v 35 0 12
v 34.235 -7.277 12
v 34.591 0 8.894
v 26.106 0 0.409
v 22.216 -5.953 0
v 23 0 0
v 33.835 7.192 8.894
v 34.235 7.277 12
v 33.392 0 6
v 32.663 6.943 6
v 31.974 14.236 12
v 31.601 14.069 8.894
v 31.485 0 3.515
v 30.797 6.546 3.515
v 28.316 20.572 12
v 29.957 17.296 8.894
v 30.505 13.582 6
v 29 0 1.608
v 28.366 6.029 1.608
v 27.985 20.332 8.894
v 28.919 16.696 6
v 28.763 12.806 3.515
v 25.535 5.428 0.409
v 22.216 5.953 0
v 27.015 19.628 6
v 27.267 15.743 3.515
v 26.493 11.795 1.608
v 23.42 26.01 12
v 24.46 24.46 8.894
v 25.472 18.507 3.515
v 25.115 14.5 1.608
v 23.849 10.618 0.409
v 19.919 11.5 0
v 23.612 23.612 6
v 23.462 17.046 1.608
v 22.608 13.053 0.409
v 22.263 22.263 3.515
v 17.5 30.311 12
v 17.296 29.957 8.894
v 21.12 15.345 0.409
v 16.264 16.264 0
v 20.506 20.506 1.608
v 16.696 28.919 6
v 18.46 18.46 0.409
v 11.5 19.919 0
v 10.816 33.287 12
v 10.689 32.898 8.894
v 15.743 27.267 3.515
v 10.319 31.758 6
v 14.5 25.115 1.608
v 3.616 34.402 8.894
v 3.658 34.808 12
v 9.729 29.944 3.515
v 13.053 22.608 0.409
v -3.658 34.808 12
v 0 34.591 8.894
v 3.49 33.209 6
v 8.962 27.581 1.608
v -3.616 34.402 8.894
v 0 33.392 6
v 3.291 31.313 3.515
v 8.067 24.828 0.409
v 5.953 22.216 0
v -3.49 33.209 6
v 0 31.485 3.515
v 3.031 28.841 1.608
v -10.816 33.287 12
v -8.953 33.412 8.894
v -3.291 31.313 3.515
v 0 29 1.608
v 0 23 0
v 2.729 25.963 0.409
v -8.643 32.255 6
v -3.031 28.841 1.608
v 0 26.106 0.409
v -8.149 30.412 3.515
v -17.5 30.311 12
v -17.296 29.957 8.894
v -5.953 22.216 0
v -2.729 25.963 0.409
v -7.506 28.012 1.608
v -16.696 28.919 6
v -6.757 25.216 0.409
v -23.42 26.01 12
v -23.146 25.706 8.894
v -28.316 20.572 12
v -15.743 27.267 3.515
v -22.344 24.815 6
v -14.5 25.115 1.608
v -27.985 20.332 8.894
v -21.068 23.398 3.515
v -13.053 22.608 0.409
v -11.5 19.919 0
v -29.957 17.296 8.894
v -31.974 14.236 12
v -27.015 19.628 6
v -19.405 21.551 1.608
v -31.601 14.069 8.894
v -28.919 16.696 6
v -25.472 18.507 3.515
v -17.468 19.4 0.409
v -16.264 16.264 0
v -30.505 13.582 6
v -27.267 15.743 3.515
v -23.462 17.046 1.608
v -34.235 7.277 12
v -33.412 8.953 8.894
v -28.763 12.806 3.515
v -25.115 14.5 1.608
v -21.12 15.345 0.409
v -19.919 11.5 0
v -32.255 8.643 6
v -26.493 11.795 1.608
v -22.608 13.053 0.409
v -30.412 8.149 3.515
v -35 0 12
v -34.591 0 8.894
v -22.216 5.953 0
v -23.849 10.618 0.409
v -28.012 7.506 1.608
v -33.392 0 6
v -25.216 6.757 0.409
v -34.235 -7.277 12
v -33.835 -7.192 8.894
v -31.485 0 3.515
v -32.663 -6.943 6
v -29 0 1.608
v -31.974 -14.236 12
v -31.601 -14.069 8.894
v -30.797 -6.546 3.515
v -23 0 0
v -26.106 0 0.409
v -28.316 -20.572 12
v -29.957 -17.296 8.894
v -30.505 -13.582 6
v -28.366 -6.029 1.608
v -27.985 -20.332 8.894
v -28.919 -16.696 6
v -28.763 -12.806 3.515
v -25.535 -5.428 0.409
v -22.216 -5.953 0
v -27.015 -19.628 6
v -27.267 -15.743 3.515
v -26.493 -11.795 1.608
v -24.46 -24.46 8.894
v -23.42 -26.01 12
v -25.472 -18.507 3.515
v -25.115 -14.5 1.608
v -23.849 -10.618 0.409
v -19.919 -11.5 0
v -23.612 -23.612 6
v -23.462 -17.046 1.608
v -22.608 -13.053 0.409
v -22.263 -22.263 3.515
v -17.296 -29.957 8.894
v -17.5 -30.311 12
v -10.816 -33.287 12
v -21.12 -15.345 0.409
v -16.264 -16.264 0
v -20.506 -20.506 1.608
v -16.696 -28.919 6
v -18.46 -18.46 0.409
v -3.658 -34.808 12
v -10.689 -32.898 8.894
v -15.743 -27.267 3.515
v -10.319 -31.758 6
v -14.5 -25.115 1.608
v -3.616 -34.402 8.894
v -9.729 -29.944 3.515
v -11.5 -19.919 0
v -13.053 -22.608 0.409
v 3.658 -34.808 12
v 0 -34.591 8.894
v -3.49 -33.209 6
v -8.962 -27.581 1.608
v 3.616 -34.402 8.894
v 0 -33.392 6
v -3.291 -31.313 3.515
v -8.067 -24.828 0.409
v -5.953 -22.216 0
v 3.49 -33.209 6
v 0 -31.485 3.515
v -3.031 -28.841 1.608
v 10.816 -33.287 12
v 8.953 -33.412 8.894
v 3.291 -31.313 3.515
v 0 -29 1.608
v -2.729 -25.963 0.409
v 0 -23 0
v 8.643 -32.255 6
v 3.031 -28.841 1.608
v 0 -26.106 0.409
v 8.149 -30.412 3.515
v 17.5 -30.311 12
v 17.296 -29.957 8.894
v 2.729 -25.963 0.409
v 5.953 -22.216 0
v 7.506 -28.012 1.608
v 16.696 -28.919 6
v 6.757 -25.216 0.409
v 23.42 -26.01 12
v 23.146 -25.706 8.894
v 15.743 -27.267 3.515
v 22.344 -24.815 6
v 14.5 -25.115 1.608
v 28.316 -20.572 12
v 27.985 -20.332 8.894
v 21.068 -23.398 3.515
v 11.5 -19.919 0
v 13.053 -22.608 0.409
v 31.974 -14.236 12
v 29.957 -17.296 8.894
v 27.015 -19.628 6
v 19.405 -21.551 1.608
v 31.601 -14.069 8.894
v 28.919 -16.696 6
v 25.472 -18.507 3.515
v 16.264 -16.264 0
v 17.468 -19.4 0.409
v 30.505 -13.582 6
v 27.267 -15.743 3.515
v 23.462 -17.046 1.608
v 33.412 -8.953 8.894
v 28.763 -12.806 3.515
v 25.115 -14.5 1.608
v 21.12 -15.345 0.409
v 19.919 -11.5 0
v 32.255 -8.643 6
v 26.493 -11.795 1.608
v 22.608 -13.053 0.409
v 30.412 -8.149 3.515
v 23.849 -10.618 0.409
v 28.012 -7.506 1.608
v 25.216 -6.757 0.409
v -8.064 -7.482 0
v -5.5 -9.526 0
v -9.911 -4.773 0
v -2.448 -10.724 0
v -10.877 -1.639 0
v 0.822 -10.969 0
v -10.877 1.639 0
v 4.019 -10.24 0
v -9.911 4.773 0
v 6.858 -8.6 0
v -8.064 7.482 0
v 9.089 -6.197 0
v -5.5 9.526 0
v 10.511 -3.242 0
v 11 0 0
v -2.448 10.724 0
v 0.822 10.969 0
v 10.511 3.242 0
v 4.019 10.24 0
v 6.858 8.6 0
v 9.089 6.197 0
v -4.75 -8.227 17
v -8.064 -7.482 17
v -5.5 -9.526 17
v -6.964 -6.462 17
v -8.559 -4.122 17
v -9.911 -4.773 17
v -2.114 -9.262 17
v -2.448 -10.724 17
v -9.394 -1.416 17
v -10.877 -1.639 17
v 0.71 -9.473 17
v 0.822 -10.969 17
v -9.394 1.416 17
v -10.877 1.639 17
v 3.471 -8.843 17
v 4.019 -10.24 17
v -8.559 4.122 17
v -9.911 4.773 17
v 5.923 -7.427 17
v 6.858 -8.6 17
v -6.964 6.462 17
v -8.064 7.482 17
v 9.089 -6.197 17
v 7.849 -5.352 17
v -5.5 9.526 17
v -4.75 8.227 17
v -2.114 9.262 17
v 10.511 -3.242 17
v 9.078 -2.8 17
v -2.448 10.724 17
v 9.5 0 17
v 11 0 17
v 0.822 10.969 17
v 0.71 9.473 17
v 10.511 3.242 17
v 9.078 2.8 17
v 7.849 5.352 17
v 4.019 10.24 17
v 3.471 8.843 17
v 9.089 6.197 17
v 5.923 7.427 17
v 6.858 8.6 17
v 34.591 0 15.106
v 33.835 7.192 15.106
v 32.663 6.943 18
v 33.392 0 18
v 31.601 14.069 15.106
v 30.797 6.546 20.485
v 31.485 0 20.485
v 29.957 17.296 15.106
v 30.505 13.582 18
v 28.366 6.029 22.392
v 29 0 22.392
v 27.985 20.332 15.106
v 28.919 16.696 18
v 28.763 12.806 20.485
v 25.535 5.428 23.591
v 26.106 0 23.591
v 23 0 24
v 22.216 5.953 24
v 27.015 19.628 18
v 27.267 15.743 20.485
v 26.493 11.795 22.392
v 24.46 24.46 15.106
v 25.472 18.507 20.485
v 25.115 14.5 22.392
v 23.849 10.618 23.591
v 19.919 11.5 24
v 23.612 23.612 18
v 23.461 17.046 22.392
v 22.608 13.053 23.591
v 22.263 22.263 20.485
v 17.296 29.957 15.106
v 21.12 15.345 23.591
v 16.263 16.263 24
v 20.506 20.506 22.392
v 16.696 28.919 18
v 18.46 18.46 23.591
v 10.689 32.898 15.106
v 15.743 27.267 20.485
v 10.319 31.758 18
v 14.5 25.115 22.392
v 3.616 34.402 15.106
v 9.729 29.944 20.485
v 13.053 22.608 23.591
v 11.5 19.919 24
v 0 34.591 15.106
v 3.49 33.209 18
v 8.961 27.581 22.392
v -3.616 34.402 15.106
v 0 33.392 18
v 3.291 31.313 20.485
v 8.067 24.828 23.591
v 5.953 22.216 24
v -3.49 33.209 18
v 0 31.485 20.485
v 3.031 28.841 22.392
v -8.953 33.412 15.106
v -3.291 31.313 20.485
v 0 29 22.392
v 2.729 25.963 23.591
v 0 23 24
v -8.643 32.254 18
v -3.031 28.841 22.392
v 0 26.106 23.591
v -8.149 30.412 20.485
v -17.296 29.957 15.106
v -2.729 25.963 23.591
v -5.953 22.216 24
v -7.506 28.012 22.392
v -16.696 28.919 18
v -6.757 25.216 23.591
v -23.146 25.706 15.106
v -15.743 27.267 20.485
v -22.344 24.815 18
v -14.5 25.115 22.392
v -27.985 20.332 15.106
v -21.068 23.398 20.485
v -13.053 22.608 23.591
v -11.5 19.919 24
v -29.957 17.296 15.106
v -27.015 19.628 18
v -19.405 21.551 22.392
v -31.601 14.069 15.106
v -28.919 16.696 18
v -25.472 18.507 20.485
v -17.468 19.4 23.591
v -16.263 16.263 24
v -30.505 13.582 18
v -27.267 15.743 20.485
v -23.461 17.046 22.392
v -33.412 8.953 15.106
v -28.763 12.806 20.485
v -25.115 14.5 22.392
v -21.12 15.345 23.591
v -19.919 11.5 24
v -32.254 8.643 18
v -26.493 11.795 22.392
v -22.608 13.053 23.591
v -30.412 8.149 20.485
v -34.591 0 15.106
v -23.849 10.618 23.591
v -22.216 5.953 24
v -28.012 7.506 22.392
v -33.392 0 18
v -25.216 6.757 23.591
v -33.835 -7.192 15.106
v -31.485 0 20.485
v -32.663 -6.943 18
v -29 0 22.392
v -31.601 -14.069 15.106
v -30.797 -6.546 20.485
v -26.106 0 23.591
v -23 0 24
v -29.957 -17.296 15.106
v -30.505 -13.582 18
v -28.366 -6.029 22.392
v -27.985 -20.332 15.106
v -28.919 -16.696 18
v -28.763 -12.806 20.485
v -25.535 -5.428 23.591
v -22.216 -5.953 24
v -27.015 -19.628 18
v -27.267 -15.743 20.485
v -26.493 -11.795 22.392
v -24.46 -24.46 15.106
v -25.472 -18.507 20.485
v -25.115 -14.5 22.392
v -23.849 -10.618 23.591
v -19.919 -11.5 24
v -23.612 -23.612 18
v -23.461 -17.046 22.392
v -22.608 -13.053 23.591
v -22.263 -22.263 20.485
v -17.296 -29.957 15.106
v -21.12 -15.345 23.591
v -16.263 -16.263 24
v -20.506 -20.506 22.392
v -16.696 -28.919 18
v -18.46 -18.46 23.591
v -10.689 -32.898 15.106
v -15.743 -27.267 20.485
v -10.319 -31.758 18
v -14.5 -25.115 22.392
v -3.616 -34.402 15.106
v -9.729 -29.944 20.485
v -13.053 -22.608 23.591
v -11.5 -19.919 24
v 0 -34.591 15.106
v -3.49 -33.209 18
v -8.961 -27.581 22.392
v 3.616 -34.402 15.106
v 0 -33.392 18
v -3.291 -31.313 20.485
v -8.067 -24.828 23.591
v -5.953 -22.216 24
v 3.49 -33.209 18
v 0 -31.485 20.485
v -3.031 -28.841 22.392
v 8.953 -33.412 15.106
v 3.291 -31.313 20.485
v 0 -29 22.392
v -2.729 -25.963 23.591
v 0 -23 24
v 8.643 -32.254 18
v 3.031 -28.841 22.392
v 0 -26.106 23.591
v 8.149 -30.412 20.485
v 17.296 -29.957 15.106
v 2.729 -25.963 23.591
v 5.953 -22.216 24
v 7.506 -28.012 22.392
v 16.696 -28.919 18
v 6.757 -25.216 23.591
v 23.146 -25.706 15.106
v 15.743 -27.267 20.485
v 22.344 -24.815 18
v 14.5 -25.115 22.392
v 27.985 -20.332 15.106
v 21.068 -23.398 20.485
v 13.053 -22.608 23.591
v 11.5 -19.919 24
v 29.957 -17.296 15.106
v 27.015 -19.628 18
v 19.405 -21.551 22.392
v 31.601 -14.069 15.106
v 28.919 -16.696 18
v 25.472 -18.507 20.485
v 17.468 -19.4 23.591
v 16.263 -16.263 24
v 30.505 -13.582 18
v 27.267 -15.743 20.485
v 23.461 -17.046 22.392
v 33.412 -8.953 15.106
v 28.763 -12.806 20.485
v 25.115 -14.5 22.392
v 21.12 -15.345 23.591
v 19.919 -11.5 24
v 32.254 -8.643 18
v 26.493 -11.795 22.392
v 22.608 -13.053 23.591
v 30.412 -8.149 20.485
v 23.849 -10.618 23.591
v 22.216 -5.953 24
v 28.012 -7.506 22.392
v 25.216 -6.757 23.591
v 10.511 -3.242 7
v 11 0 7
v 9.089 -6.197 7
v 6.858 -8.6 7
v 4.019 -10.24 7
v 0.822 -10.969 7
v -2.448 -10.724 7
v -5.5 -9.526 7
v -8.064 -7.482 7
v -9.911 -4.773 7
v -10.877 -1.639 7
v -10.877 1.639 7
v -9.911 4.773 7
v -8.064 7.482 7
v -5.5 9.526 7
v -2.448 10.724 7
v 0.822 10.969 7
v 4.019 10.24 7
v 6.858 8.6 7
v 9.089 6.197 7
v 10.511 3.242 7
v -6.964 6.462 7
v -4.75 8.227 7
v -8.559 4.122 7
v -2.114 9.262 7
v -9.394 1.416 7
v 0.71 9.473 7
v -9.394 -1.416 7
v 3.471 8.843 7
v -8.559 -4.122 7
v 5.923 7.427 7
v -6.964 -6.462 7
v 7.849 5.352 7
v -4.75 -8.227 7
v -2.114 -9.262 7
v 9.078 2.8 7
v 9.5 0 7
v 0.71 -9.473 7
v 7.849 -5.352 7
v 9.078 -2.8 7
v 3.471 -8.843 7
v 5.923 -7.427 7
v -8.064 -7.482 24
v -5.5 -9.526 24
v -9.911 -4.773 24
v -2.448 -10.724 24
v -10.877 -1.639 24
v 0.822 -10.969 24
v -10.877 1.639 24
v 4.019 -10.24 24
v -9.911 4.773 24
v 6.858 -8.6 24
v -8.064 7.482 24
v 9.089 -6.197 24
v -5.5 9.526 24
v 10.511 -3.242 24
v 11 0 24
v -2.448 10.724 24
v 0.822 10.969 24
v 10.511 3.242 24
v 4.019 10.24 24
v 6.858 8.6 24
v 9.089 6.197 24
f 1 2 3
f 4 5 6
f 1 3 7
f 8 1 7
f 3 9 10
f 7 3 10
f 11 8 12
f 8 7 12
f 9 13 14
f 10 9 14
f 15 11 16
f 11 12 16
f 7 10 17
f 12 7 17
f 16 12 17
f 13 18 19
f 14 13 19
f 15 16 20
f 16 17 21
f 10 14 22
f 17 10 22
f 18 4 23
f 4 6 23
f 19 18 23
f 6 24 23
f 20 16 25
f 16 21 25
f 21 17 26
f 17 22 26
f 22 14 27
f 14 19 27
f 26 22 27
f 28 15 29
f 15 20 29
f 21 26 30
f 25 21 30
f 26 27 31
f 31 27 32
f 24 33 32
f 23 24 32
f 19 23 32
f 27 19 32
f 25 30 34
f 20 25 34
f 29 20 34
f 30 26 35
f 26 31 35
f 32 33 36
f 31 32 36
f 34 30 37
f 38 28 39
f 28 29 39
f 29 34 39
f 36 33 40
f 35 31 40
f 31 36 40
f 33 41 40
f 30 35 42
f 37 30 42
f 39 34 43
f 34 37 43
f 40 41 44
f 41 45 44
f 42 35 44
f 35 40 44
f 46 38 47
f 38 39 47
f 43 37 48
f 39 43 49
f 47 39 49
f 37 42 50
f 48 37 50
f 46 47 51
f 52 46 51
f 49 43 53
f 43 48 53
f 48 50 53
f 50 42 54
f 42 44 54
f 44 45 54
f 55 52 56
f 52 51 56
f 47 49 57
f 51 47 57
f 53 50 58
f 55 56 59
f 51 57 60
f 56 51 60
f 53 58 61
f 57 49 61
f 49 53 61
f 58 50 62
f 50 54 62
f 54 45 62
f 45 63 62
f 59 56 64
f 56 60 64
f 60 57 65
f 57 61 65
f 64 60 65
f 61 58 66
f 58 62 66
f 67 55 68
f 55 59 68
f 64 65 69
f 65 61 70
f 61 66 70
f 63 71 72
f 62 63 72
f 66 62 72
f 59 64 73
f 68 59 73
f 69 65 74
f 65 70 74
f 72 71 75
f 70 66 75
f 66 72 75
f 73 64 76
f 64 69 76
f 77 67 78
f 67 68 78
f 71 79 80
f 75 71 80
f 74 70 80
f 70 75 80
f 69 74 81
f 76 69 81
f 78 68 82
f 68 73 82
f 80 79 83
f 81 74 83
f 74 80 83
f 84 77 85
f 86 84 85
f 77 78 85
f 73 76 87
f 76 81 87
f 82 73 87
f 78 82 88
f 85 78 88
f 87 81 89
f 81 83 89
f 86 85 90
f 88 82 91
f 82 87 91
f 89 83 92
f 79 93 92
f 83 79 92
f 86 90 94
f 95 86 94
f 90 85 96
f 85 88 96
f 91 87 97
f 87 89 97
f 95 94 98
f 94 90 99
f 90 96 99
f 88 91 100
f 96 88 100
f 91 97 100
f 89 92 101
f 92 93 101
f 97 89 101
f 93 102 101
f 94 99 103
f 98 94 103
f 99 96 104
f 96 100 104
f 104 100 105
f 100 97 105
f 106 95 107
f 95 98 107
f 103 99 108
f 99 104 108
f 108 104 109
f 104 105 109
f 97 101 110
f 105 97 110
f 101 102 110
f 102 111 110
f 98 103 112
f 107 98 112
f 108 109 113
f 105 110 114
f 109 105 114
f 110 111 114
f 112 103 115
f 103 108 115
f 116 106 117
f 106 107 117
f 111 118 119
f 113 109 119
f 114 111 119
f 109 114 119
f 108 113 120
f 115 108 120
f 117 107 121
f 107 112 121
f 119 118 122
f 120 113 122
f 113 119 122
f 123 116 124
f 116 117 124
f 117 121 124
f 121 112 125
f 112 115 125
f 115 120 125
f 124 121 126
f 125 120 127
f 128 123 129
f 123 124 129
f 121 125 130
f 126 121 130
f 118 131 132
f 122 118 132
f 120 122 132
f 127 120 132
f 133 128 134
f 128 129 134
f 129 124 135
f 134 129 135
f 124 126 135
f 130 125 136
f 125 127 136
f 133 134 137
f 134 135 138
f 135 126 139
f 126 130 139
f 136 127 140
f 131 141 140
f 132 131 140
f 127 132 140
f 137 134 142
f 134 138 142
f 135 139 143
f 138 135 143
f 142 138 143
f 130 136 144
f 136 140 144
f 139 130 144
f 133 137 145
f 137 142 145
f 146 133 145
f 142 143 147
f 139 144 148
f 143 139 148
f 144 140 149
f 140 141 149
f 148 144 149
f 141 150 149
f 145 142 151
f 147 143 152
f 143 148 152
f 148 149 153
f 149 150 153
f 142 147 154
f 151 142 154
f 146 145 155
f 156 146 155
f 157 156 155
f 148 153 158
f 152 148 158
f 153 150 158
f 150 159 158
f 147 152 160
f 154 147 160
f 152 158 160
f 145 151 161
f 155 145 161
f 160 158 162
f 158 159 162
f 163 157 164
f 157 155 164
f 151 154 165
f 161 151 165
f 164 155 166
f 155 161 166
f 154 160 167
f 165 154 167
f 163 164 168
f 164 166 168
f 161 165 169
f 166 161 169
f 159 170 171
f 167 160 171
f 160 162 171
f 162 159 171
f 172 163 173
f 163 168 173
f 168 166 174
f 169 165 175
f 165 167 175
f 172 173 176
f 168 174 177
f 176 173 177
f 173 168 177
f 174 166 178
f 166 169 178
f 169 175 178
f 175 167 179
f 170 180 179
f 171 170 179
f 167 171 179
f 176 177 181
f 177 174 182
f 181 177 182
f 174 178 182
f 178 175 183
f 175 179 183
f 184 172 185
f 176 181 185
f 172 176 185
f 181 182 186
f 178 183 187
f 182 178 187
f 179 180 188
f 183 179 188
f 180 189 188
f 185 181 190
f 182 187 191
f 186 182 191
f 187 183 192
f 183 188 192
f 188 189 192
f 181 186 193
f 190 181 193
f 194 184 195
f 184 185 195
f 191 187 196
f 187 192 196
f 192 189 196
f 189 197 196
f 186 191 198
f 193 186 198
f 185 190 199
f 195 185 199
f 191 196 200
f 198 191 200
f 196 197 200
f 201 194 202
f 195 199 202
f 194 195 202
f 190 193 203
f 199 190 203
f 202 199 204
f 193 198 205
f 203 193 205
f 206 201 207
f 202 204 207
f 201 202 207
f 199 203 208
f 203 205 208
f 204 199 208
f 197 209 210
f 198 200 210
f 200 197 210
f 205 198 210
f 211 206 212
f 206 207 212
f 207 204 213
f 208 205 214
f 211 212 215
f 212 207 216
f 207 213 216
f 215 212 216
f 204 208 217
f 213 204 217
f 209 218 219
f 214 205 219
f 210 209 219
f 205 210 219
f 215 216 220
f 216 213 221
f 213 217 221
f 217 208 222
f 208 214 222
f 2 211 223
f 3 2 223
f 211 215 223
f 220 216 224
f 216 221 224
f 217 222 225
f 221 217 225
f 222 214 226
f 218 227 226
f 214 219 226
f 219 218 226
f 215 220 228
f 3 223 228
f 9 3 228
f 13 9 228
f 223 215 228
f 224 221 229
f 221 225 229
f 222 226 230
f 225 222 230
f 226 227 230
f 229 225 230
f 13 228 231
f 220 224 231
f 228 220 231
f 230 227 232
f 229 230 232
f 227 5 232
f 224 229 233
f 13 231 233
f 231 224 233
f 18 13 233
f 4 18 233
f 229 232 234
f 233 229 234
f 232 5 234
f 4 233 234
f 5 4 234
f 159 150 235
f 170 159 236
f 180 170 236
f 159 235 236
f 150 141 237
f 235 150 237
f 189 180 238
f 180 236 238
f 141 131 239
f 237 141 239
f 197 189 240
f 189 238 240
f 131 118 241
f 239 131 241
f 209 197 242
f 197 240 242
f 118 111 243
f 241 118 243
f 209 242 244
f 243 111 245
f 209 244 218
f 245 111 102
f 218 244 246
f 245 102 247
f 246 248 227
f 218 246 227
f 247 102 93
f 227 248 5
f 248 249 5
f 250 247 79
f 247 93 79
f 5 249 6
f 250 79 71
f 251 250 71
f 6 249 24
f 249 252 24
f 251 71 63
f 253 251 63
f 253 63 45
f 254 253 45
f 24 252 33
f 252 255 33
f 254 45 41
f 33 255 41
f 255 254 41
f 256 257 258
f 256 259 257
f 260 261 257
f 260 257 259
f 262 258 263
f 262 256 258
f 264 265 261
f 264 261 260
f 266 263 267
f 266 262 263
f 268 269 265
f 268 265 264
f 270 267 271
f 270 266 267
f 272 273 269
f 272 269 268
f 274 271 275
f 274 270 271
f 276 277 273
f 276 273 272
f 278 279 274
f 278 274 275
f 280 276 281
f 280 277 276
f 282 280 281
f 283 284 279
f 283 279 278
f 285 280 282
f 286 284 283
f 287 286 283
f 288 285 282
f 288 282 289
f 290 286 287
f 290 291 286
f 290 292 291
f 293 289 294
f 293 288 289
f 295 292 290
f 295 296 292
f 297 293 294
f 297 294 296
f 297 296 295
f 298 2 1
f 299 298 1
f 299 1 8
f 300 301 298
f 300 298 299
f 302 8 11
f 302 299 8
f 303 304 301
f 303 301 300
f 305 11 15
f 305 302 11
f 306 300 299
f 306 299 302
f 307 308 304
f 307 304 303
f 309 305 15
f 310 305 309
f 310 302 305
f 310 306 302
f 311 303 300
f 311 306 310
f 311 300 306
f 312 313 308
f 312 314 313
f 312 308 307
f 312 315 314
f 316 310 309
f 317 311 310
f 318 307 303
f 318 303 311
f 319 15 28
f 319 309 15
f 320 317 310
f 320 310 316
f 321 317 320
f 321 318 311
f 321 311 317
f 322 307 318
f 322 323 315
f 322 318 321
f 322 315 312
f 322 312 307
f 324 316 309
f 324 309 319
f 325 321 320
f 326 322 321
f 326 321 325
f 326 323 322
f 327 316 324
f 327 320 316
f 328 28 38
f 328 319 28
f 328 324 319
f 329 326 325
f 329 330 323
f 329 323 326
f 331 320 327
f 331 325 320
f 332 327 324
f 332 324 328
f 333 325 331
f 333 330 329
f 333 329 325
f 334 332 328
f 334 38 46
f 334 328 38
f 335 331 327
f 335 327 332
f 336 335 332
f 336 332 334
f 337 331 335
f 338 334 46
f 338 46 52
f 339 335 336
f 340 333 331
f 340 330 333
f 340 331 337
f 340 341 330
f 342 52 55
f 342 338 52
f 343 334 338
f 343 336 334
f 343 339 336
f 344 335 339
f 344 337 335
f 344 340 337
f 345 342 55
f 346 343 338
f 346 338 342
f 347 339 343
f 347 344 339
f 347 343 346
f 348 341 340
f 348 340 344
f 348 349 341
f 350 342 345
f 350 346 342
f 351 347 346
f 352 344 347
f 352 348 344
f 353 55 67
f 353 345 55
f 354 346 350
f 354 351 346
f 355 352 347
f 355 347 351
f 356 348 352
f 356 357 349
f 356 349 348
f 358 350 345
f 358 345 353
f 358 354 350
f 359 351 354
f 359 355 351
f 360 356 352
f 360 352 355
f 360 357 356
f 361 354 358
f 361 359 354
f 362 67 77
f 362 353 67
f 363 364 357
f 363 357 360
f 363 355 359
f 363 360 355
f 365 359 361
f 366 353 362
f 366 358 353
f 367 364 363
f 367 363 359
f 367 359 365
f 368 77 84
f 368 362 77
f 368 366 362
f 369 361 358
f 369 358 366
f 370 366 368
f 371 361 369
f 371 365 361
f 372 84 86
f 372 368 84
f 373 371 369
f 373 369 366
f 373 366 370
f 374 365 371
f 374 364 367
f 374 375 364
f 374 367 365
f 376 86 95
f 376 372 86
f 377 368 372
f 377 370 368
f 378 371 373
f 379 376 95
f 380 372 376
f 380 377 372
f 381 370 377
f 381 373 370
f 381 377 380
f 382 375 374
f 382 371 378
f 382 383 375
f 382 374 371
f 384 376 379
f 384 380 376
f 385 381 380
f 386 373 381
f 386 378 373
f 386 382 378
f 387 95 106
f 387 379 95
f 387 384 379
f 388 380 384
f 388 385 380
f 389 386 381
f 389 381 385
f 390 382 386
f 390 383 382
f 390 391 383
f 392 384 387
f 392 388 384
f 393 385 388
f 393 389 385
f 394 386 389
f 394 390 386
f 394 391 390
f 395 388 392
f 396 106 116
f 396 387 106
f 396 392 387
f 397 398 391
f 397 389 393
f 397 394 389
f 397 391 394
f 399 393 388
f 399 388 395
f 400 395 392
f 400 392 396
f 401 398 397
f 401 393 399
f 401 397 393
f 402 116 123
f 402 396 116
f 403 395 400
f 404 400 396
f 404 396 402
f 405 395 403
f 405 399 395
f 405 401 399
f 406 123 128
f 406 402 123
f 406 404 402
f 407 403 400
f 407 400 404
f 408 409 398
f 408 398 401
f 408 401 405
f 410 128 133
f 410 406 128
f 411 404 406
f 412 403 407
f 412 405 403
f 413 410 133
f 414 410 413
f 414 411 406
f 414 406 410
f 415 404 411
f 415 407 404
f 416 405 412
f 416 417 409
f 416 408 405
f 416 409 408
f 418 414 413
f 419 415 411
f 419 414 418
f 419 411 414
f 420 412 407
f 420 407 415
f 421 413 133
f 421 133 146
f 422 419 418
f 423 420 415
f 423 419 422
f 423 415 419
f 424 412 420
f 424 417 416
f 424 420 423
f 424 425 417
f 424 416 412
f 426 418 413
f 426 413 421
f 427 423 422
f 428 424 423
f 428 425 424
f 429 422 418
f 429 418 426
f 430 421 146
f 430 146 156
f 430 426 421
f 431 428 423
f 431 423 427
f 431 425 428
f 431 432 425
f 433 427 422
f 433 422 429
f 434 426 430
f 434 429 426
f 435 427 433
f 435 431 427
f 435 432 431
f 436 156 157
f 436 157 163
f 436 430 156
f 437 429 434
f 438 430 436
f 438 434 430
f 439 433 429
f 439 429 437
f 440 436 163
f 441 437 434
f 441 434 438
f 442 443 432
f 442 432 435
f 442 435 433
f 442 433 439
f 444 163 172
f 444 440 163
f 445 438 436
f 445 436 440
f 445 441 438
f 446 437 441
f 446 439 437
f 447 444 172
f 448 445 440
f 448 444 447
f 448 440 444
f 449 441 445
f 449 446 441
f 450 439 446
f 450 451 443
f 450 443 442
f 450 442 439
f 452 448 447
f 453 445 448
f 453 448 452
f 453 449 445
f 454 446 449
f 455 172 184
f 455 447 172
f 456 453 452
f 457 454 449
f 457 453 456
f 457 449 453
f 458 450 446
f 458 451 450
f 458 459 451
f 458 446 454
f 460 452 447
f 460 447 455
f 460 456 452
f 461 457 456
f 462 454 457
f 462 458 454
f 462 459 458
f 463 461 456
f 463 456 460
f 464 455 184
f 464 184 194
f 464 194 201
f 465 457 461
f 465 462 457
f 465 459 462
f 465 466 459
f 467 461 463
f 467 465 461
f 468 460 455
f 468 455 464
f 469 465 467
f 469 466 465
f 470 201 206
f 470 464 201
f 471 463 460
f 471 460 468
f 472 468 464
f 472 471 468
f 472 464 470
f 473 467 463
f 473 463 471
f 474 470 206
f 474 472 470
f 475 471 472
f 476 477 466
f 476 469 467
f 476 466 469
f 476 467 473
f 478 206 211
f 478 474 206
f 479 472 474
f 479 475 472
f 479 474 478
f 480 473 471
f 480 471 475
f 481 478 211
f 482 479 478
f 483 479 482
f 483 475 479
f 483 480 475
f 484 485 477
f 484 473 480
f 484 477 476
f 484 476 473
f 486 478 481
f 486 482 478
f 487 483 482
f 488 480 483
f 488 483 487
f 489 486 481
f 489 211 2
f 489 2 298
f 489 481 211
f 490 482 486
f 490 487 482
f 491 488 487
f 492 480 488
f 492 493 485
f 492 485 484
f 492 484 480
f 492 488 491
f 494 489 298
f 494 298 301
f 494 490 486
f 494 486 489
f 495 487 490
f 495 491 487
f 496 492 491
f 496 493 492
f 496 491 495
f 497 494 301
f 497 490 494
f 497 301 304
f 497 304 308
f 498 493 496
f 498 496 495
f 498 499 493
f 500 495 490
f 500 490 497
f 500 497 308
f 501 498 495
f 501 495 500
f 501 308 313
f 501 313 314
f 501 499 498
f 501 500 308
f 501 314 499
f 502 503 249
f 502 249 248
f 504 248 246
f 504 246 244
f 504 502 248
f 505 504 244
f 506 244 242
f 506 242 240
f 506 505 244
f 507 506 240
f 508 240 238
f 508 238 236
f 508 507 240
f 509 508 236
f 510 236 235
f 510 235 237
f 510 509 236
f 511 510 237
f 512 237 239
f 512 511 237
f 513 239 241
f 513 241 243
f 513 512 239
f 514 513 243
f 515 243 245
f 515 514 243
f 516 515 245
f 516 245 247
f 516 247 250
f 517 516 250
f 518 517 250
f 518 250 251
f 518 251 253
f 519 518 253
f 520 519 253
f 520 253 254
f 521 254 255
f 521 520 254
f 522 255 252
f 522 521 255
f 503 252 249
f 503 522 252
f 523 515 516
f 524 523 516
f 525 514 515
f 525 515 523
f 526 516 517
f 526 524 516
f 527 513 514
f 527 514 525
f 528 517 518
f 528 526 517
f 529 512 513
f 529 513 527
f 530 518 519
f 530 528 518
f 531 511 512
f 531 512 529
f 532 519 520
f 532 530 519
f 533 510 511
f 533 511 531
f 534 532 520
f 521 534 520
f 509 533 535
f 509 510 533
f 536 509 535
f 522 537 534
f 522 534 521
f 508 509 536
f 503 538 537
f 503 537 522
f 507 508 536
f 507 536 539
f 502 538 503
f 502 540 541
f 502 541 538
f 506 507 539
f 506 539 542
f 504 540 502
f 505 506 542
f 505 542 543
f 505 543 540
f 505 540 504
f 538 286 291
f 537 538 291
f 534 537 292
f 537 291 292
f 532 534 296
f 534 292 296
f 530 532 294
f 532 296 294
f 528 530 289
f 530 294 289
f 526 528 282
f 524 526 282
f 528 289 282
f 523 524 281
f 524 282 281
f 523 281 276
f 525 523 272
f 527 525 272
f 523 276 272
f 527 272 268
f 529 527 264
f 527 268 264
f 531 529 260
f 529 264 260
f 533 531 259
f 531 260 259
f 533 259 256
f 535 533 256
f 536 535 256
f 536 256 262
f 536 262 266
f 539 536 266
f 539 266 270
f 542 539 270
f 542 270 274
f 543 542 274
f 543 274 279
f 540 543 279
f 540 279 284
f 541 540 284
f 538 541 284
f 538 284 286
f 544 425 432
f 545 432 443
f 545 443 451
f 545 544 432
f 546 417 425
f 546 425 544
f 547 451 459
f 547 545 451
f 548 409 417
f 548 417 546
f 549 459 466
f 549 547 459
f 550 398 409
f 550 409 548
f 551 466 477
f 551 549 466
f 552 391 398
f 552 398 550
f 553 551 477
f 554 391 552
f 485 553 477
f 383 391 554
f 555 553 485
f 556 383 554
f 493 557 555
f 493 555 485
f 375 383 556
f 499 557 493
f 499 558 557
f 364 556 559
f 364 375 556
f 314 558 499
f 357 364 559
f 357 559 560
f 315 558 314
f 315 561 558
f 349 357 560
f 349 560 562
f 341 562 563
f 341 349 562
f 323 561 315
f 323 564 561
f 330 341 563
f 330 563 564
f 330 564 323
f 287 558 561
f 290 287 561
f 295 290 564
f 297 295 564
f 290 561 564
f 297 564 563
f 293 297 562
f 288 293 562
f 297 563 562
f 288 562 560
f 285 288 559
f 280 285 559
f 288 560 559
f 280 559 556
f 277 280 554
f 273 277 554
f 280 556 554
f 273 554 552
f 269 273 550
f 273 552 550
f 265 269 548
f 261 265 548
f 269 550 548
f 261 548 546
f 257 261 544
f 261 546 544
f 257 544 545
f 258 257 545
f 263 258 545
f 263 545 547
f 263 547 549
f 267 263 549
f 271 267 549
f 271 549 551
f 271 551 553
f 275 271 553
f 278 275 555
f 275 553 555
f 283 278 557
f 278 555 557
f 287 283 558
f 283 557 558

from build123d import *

# Parameters (mm, degrees)
ESQUISSE1_R             = 35
EXTRUSION1_DEPTH        = 24
CONG_1_R                = 12
CONG_2_R                = 12
ESQUISSE2_R             = 11
ENL_V_MAT_EXTRU_1_DEPTH = 7
ENL_V_START             = -7
ESQUISSE3_R             = 11
ENL_V_MAT_EXTRU_2_DEPTH = 7
ESQUISSE5_R             = 9.5
ENL_V_MAT_EXTRU_3_DEPTH = 53.335456499


with BuildPart() as part:
    # Esquisse1 → Extrusion1 (new body)
    with BuildSketch(Plane.XY):
        Circle(ESQUISSE1_R)
    extrude(amount=EXTRUSION1_DEPTH)

    # Congé1
    cong_1_edges = [part.edges().sort_by_distance(p)[0] for p in [
        (-35, 0, 24),
    ]]
    fillet(cong_1_edges, radius=CONG_1_R)

    # Congé2
    cong_2_edges = [part.edges().sort_by_distance(p)[0] for p in [
        (-35, 0, 0),
    ]]
    fillet(cong_2_edges, radius=CONG_2_R - 0.0001)  # a hair under: the kernel refuses the full size

    # Esquisse2 → Enlèv. mat.-Extru.1 (cut)
    with BuildSketch(Plane.XY.offset(24)):
        Circle(ESQUISSE2_R)
    extrude(amount=-ENL_V_MAT_EXTRU_1_DEPTH, mode=Mode.SUBTRACT)

    # Esquisse3 → Enlèv. mat.-Extru.2 (cut)
    with BuildSketch(Plane(origin=(0, 0, 0), x_dir=(-1, 0, 0), z_dir=(0, 0, -1)).offset(ENL_V_START)):
        with Locations(Location((0, 0, 0), (0, 0, 180))):
            Circle(ESQUISSE3_R)
    extrude(amount=ENL_V_MAT_EXTRU_2_DEPTH, mode=Mode.SUBTRACT)

    # Esquisse5 → Enlèv. mat.-Extru.3 (cut, through all)
    with BuildSketch(Plane.XY.offset(17)):
        Circle(ESQUISSE5_R)
    extrude(amount=-ENL_V_MAT_EXTRU_3_DEPTH, mode=Mode.SUBTRACT)


solid = part.part
